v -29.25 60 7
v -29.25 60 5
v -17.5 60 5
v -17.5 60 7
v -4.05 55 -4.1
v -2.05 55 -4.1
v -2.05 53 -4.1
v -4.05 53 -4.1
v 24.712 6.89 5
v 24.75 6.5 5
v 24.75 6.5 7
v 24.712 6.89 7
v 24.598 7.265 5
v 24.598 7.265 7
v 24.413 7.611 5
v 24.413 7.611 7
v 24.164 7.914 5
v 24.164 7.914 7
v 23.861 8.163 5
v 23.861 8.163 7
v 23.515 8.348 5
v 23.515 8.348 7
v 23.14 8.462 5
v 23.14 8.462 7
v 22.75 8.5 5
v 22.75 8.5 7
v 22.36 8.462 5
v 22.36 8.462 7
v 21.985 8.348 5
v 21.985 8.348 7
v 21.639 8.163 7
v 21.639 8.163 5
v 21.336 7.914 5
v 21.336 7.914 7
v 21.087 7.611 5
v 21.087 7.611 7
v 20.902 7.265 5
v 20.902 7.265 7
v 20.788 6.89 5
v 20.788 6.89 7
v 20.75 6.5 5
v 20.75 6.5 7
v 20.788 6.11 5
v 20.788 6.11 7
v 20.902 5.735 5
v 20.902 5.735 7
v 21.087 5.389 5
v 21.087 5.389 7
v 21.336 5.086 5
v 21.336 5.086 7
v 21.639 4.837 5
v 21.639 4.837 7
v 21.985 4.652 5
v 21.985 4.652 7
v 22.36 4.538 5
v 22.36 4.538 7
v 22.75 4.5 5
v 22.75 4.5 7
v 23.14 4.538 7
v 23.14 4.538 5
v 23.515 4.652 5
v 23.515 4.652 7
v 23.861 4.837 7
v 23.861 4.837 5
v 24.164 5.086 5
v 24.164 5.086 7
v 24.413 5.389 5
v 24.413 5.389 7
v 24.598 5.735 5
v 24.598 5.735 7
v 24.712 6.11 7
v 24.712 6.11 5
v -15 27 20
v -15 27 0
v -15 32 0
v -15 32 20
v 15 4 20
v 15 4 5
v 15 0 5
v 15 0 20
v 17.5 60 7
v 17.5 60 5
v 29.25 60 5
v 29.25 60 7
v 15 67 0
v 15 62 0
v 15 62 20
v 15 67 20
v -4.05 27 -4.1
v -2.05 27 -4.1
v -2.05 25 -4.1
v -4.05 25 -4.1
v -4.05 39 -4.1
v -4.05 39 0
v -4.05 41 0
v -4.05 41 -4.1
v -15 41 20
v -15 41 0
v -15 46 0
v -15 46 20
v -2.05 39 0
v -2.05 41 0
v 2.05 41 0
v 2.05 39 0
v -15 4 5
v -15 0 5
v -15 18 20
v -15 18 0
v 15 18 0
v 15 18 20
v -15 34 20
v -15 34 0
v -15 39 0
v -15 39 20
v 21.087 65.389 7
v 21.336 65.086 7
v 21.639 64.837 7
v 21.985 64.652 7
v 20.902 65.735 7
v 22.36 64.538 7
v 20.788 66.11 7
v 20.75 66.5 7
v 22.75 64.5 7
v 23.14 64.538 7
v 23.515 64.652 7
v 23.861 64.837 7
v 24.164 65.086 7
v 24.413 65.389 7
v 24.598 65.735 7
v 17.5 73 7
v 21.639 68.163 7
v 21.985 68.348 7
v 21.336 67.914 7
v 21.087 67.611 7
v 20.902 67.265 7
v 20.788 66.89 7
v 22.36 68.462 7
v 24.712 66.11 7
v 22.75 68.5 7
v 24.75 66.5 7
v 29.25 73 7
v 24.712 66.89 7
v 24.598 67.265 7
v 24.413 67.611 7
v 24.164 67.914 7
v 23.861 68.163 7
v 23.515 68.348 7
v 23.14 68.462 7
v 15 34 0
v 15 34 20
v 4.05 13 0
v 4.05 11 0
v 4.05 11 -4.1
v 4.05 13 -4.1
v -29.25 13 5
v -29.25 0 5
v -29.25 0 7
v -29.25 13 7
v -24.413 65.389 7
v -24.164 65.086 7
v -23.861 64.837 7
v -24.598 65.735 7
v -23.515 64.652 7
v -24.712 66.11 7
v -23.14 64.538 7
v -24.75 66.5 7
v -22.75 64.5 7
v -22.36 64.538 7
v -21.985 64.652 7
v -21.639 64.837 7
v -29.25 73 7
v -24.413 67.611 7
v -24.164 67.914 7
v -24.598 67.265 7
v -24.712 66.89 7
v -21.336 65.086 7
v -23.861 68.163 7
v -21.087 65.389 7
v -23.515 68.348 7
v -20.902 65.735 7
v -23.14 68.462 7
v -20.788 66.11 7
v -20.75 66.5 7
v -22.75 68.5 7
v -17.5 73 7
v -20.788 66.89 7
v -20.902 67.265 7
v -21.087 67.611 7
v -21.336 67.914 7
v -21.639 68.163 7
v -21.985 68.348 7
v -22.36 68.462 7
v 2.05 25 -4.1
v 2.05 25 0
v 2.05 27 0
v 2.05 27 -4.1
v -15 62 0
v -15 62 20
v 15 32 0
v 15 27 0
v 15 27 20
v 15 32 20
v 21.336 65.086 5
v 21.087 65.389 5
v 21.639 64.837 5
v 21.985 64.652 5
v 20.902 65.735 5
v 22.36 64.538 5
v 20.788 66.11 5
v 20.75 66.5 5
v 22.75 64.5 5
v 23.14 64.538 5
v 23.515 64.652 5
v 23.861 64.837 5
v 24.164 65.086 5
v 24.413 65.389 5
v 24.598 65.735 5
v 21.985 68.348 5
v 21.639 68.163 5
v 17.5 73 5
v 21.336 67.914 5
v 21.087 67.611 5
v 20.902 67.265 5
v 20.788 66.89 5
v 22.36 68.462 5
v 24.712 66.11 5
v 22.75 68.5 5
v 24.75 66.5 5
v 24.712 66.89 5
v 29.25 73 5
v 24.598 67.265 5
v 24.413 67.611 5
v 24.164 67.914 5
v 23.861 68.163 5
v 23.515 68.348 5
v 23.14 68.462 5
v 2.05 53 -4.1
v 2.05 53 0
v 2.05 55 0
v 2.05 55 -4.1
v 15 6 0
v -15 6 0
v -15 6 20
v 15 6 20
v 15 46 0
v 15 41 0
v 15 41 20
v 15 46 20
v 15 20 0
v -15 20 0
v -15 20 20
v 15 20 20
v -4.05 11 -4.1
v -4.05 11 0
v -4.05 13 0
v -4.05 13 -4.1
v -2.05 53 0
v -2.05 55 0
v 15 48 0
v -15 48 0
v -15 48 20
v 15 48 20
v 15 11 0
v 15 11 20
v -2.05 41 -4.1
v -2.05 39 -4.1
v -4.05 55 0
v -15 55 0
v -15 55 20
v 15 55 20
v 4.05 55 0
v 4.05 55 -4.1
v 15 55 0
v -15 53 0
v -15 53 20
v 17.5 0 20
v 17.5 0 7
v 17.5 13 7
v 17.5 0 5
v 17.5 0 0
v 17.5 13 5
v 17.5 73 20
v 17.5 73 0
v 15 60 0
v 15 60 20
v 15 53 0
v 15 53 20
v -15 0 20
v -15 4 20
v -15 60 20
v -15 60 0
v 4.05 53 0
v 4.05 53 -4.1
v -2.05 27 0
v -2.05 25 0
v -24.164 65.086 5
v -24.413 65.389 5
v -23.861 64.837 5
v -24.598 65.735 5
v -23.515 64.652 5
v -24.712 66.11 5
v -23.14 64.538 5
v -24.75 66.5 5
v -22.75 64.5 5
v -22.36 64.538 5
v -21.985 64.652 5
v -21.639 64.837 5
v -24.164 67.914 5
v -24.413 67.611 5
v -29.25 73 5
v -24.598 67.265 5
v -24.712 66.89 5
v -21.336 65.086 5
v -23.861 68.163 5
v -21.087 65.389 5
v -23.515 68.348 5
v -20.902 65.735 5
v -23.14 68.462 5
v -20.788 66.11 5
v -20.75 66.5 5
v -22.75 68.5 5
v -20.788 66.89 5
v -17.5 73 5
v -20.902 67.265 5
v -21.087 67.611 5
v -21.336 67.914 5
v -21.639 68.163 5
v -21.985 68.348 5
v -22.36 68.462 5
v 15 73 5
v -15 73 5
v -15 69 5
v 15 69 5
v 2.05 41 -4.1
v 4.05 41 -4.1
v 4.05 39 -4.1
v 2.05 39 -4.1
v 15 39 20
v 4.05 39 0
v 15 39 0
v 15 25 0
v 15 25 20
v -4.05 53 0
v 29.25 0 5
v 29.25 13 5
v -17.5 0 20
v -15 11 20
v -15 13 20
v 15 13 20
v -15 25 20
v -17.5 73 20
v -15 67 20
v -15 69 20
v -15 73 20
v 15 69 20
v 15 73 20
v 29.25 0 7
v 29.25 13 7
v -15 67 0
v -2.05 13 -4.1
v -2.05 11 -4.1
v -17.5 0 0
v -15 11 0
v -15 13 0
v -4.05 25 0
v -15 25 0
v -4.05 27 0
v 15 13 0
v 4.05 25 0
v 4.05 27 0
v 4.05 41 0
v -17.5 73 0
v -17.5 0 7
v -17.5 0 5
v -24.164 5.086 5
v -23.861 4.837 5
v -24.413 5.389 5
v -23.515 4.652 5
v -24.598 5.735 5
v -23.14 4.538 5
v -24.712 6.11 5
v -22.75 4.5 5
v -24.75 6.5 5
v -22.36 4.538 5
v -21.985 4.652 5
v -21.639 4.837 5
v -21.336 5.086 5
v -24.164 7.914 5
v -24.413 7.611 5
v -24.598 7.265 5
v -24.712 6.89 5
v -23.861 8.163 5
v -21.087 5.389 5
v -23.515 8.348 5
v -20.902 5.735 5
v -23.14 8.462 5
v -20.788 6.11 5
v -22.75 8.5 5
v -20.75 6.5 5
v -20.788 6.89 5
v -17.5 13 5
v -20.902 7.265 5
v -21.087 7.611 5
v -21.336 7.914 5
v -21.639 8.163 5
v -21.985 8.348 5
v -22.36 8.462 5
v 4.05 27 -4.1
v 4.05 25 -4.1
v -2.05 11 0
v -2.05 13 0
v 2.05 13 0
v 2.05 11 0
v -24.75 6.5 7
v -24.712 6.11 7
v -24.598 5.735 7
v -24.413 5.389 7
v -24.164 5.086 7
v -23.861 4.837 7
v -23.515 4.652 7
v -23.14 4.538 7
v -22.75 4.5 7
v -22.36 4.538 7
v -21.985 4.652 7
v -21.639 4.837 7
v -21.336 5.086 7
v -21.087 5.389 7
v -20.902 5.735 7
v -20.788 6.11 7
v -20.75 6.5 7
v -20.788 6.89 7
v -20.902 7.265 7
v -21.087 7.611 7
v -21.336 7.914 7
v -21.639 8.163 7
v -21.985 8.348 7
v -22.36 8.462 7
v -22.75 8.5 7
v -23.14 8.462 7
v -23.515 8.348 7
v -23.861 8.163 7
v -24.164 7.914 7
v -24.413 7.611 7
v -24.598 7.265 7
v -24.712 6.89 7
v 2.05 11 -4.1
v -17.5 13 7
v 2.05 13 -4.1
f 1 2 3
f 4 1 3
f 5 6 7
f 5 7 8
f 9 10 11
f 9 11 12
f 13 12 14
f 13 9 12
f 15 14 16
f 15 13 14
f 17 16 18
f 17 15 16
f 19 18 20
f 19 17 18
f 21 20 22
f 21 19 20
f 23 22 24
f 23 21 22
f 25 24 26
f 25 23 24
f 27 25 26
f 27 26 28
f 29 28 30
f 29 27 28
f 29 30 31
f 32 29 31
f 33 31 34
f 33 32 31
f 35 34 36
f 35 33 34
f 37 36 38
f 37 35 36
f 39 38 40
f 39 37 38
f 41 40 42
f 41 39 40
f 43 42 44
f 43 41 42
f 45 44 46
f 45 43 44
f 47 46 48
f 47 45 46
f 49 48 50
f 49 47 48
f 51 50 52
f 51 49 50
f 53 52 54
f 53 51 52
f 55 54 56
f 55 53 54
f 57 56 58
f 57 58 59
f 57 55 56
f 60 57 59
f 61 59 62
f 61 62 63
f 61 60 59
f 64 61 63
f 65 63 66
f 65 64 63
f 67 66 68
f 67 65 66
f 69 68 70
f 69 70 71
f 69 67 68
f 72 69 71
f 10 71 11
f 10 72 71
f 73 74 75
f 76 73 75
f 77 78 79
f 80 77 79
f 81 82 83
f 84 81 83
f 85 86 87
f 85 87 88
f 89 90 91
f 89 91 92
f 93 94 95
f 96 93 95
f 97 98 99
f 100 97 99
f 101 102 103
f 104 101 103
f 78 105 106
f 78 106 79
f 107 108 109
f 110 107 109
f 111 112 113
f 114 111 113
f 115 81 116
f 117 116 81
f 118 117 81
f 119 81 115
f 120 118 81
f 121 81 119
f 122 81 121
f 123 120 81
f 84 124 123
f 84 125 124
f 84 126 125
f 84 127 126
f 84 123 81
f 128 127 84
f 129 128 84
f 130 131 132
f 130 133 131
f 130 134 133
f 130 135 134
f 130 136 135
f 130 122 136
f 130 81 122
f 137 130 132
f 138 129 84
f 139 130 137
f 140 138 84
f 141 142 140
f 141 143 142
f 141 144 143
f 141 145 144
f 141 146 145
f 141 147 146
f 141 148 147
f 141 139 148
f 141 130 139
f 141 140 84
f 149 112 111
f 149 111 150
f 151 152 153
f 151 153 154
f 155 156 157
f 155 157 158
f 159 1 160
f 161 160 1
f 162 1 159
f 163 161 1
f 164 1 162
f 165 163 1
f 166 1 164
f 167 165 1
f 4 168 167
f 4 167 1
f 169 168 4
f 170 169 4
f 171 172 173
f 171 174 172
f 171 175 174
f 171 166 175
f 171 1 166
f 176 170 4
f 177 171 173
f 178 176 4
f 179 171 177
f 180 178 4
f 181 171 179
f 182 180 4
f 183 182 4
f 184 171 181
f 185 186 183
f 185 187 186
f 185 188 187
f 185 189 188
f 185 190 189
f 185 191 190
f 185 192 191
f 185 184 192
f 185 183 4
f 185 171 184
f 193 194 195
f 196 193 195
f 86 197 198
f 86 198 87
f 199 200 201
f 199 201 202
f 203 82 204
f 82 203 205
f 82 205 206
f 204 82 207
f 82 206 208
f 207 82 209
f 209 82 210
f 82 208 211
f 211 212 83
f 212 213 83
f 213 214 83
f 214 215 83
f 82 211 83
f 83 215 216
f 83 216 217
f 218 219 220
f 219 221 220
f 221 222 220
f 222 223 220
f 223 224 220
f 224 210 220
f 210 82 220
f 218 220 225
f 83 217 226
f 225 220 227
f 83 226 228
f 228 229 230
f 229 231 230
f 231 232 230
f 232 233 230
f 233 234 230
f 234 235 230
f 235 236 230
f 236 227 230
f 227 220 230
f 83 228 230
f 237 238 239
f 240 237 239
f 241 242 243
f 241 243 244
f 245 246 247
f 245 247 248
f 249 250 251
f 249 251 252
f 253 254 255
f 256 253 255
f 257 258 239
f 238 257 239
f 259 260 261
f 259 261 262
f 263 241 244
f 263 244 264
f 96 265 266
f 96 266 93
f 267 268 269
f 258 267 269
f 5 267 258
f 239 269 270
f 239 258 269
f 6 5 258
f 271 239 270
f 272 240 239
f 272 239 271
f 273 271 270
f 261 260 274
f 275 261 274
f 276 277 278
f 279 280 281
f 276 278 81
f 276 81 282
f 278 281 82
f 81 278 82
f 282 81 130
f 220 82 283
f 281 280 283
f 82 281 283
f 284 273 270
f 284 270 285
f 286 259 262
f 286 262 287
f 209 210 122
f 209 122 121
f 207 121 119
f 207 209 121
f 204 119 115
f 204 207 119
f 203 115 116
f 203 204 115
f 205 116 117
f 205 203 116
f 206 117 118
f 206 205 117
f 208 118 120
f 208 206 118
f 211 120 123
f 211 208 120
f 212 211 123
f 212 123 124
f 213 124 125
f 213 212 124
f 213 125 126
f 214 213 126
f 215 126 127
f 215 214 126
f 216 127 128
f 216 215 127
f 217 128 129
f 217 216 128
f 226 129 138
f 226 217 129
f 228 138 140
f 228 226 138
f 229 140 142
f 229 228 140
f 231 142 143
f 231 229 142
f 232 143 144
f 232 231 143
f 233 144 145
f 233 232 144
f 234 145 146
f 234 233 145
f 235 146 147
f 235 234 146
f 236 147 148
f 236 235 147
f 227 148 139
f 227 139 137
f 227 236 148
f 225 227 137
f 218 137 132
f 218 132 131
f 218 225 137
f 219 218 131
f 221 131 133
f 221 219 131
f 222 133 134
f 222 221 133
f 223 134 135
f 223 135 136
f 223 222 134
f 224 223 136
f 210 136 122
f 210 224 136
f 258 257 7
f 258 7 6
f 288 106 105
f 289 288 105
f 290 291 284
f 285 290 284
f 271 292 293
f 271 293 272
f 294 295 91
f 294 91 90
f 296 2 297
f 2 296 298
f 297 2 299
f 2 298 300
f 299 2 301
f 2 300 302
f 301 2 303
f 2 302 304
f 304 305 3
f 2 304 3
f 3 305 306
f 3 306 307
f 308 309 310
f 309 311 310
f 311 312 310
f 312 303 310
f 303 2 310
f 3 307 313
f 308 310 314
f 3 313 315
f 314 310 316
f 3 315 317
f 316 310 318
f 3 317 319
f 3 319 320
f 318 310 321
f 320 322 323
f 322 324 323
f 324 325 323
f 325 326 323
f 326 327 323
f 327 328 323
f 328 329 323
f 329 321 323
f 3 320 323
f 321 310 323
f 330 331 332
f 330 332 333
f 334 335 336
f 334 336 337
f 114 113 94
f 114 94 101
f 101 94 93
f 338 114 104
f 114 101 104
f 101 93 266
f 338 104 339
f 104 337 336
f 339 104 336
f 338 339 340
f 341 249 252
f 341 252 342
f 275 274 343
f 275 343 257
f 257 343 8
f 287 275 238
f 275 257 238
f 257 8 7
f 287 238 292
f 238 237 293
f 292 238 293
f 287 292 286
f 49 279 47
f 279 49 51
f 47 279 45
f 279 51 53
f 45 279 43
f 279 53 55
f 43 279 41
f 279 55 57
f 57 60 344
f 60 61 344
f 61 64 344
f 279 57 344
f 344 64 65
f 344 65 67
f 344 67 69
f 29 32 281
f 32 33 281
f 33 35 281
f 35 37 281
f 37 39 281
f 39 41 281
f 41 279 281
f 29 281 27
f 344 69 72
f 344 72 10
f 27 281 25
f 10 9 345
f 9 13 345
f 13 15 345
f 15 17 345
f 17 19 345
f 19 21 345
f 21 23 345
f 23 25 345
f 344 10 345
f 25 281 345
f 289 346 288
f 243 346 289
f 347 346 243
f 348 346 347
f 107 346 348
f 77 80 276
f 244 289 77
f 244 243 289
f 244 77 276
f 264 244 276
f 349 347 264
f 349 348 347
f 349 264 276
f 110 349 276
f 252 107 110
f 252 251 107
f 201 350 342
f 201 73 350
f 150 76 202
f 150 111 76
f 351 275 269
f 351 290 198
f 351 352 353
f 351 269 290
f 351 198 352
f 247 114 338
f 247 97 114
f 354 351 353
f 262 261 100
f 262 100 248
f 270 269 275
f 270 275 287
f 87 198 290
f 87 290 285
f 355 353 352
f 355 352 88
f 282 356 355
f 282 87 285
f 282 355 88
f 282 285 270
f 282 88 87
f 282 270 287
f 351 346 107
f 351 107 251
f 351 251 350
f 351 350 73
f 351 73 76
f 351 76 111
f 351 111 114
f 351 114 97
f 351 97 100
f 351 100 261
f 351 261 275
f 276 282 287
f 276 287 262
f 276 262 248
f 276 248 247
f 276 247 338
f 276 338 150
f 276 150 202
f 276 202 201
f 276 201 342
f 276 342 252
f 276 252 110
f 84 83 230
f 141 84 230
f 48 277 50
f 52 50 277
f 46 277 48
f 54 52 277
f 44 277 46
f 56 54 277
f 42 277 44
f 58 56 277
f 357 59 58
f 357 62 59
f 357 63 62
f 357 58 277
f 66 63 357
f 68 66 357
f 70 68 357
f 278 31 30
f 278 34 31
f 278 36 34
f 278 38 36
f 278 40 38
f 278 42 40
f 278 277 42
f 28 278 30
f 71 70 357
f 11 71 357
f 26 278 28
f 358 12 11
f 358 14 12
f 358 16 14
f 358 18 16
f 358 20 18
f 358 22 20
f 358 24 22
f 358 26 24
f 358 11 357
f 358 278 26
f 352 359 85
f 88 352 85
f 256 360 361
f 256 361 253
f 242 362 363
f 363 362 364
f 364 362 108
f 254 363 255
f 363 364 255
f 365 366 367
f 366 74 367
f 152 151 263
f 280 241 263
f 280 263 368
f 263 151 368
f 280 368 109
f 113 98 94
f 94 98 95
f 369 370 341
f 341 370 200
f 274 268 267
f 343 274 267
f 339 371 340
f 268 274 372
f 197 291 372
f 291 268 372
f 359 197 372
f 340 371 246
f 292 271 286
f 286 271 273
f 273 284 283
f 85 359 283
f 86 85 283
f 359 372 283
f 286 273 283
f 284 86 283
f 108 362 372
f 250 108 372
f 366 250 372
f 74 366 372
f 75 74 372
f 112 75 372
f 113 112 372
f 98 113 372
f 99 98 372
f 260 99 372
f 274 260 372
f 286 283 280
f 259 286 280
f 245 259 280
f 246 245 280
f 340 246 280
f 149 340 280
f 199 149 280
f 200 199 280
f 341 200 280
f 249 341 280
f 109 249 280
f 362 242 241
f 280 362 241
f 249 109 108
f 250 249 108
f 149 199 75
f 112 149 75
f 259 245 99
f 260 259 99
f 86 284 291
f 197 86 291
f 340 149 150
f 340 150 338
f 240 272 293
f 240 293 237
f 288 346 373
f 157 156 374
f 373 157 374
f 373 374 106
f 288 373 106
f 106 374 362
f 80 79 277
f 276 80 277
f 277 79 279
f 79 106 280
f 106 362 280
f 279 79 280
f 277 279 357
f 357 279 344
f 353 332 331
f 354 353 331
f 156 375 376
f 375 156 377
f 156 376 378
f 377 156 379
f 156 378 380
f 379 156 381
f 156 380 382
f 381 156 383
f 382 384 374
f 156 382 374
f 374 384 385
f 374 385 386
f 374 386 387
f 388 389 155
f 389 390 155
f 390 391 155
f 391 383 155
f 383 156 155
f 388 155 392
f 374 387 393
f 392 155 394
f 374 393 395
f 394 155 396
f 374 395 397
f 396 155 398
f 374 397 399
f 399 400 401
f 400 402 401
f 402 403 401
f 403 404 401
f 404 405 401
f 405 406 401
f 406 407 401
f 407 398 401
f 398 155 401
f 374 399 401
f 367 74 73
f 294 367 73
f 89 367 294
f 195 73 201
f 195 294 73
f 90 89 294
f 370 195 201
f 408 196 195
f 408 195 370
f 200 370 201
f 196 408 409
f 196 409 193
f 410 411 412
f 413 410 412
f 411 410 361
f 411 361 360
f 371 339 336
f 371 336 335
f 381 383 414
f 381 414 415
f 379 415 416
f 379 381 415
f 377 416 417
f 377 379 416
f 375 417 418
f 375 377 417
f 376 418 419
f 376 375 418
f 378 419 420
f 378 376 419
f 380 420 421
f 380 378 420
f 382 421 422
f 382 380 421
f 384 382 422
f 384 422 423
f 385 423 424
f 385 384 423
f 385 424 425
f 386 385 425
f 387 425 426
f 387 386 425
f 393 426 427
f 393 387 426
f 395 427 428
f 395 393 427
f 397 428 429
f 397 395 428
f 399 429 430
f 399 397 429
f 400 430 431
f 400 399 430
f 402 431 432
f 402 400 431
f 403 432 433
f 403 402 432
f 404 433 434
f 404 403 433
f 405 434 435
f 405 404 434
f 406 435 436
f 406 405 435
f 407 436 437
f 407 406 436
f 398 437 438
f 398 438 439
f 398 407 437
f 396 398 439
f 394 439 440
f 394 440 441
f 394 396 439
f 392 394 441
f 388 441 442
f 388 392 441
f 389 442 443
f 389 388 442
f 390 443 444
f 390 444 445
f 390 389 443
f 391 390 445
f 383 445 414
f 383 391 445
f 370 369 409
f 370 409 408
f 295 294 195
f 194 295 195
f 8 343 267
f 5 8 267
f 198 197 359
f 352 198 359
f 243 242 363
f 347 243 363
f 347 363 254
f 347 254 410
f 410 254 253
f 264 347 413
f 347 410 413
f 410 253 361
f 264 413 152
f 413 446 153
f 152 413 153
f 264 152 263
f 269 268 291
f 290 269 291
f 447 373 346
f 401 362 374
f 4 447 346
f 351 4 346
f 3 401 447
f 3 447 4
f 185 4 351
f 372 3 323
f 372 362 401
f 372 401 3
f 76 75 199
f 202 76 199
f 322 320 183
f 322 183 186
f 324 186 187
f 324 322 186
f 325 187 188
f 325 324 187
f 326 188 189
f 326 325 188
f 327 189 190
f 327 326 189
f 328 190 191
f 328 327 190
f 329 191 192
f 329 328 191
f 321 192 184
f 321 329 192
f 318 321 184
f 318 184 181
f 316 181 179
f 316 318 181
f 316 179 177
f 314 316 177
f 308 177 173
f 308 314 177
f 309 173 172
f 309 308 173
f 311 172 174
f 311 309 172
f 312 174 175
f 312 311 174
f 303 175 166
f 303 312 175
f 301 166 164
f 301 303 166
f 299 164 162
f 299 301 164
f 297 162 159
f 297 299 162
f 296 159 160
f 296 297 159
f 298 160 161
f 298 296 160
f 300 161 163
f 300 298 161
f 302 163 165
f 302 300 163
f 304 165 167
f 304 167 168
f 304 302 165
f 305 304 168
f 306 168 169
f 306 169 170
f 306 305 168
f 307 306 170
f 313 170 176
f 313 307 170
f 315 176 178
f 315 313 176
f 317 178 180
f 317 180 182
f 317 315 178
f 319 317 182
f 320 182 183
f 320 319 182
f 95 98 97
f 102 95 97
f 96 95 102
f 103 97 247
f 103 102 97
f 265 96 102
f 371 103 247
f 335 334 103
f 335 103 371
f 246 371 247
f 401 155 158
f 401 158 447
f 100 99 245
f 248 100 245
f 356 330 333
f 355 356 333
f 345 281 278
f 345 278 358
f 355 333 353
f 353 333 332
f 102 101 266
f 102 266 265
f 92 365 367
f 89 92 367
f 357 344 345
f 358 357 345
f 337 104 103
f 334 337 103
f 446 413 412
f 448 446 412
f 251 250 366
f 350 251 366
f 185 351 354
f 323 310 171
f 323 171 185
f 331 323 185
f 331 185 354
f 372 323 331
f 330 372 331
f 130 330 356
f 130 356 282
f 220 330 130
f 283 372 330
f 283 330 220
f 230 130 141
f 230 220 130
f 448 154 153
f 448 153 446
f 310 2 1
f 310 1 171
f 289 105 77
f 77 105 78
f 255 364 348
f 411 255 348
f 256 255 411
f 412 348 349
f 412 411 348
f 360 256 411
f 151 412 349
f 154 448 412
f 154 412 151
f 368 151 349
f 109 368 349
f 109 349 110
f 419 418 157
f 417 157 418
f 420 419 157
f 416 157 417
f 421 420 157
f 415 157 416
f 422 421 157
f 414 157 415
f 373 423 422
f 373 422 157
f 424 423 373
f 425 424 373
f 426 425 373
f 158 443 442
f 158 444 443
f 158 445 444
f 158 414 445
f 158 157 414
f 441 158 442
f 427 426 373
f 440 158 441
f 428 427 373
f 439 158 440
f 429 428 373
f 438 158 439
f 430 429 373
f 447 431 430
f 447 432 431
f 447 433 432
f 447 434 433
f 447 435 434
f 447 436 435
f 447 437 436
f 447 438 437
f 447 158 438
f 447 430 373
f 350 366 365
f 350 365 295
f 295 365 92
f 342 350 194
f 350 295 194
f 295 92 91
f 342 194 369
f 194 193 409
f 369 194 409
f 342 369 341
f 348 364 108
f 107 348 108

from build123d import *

# Parameters (mm, degrees)
SKETCH1_W           = 35
SKETCH1_H           = 73
SKETCH1_W_2         = 30
SKETCH1_H_2         = 5
BOSS_EXTRUDE1_DEPTH = 5
SKETCH2_W           = 2
SKETCH2_H           = 2
BOSS_EXTRUDE2_DEPTH = 4.1
SKETCH4_W           = 13
SKETCH4_H           = 13
SKETCH4_R           = 2
BOSS_EXTRUDE3_DEPTH = 2
SKETCH7_W           = 30
SKETCH7_H           = 5
BOSS_EXTRUDE4_DEPTH = 20


with BuildPart() as part:
    # Sketch1 → Boss-Extrude1 (new body)
    with BuildSketch(Plane.XY):
        with Locations((0, 36.5)):
            Rectangle(SKETCH1_W, SKETCH1_H)
        with Locations((0, 64.5)):
            Rectangle(SKETCH1_W_2, SKETCH1_H_2, mode=Mode.SUBTRACT)
        with Locations((0, 57.5)):
            Rectangle(SKETCH1_W_2, SKETCH1_H_2, mode=Mode.SUBTRACT)
        with Locations((0, 50.5)):
            Rectangle(SKETCH1_W_2, SKETCH1_H_2, mode=Mode.SUBTRACT)
        with Locations((0, 43.5)):
            Rectangle(SKETCH1_W_2, SKETCH1_H_2, mode=Mode.SUBTRACT)
        with Locations((0, 36.5)):
            Rectangle(SKETCH1_W_2, SKETCH1_H_2, mode=Mode.SUBTRACT)
        with Locations((0, 29.5)):
            Rectangle(SKETCH1_W_2, SKETCH1_H_2, mode=Mode.SUBTRACT)
        with Locations((0, 22.5)):
            Rectangle(SKETCH1_W_2, SKETCH1_H_2, mode=Mode.SUBTRACT)
        with Locations((0, 15.5)):
            Rectangle(SKETCH1_W_2, SKETCH1_H_2, mode=Mode.SUBTRACT)
        with Locations((0, 8.5)):
            Rectangle(SKETCH1_W_2, SKETCH1_H_2, mode=Mode.SUBTRACT)
    extrude(amount=BOSS_EXTRUDE1_DEPTH)

    # Sketch2 → Boss-Extrude2 (add)
    with BuildSketch(Plane(origin=(0, 0, 0), x_dir=(-1, 0, 0), z_dir=(0, 0, -1))):
        with Locations((-3.05, 40)):
            Rectangle(SKETCH2_W, SKETCH2_H)
        with Locations((3.05, 40)):
            Rectangle(SKETCH2_W, SKETCH2_H)
        with Locations((-3.05, 54)):
            Rectangle(SKETCH2_W, SKETCH2_H)
        with Locations((3.05, 54)):
            Rectangle(SKETCH2_W, SKETCH2_H)
        with Locations((-3.05, 26)):
            Rectangle(SKETCH2_W, SKETCH2_H)
        with Locations((3.05, 26)):
            Rectangle(SKETCH2_W, SKETCH2_H)
        with Locations((-3.05, 12)):
            Rectangle(SKETCH2_W, SKETCH2_H)
        with Locations((3.05, 12)):
            Rectangle(SKETCH2_W, SKETCH2_H)
    extrude(amount=BOSS_EXTRUDE2_DEPTH)

    # Sketch4 → Boss-Extrude3 (add)
    # profile 1 of 4: a face of its own
    with BuildSketch(Plane.XY.offset(5)):
        with Locations((-22.75, 66.5)):
            Rectangle(SKETCH4_W, SKETCH4_H)
        with Locations((-22.75, 66.5)):
            Circle(SKETCH4_R, mode=Mode.SUBTRACT)
    # profile 2 of 4: a face of its own
    with BuildSketch(Plane.XY.offset(5)):
        with Locations((-22.75, 6.5)):
            Rectangle(SKETCH4_W, SKETCH4_H)
        with Locations(Location((-22.75, 6.5, 0), (0, 0, 180))):
            Circle(SKETCH4_R, mode=Mode.SUBTRACT)
    # profile 3 of 4: a face of its own
    with BuildSketch(Plane.XY.offset(5)):
        with Locations((22.75, 66.5)):
            Rectangle(SKETCH4_W, SKETCH4_H)
        with Locations(Location((22.75, 66.5, 0), (0, 0, 180))):
            Circle(SKETCH4_R, mode=Mode.SUBTRACT)
    # profile 4 of 4: a face of its own
    with BuildSketch(Plane.XY.offset(5)):
        with Locations((22.75, 6.5)):
            Rectangle(SKETCH4_W, SKETCH4_H)
        with Locations((22.75, 6.5)):
            Circle(SKETCH4_R, mode=Mode.SUBTRACT)
    extrude(amount=BOSS_EXTRUDE3_DEPTH)

    # Sketch7 → Boss-Extrude4 (add)
    with BuildSketch(Plane.XY):
        Polygon((-15, 69), (-15, 73), (-17.5, 73), (-17.5, 0), (-15, 0), (-15, 4), (15, 4), (15, 0), (17.5, 0), (17.5, 73), (15, 73), (15, 69), align=None)
        with Locations((0, 64.5)):
            Rectangle(SKETCH7_W, SKETCH7_H, mode=Mode.SUBTRACT)
        with Locations((0, 8.5)):
            Rectangle(SKETCH7_W, SKETCH7_H, mode=Mode.SUBTRACT)
        with Locations((0, 15.5)):
            Rectangle(SKETCH7_W, SKETCH7_H, mode=Mode.SUBTRACT)
        with Locations((0, 22.5)):
            Rectangle(SKETCH7_W, SKETCH7_H, mode=Mode.SUBTRACT)
        with Locations((0, 29.5)):
            Rectangle(SKETCH7_W, SKETCH7_H, mode=Mode.SUBTRACT)
        with Locations((0, 36.5)):
            Rectangle(SKETCH7_W, SKETCH7_H, mode=Mode.SUBTRACT)
        with Locations((0, 43.5)):
            Rectangle(SKETCH7_W, SKETCH7_H, mode=Mode.SUBTRACT)
        with Locations((0, 50.5)):
            Rectangle(SKETCH7_W, SKETCH7_H, mode=Mode.SUBTRACT)
        with Locations((0, 57.5)):
            Rectangle(SKETCH7_W, SKETCH7_H, mode=Mode.SUBTRACT)
    extrude(amount=BOSS_EXTRUDE4_DEPTH)


solid = part.part
